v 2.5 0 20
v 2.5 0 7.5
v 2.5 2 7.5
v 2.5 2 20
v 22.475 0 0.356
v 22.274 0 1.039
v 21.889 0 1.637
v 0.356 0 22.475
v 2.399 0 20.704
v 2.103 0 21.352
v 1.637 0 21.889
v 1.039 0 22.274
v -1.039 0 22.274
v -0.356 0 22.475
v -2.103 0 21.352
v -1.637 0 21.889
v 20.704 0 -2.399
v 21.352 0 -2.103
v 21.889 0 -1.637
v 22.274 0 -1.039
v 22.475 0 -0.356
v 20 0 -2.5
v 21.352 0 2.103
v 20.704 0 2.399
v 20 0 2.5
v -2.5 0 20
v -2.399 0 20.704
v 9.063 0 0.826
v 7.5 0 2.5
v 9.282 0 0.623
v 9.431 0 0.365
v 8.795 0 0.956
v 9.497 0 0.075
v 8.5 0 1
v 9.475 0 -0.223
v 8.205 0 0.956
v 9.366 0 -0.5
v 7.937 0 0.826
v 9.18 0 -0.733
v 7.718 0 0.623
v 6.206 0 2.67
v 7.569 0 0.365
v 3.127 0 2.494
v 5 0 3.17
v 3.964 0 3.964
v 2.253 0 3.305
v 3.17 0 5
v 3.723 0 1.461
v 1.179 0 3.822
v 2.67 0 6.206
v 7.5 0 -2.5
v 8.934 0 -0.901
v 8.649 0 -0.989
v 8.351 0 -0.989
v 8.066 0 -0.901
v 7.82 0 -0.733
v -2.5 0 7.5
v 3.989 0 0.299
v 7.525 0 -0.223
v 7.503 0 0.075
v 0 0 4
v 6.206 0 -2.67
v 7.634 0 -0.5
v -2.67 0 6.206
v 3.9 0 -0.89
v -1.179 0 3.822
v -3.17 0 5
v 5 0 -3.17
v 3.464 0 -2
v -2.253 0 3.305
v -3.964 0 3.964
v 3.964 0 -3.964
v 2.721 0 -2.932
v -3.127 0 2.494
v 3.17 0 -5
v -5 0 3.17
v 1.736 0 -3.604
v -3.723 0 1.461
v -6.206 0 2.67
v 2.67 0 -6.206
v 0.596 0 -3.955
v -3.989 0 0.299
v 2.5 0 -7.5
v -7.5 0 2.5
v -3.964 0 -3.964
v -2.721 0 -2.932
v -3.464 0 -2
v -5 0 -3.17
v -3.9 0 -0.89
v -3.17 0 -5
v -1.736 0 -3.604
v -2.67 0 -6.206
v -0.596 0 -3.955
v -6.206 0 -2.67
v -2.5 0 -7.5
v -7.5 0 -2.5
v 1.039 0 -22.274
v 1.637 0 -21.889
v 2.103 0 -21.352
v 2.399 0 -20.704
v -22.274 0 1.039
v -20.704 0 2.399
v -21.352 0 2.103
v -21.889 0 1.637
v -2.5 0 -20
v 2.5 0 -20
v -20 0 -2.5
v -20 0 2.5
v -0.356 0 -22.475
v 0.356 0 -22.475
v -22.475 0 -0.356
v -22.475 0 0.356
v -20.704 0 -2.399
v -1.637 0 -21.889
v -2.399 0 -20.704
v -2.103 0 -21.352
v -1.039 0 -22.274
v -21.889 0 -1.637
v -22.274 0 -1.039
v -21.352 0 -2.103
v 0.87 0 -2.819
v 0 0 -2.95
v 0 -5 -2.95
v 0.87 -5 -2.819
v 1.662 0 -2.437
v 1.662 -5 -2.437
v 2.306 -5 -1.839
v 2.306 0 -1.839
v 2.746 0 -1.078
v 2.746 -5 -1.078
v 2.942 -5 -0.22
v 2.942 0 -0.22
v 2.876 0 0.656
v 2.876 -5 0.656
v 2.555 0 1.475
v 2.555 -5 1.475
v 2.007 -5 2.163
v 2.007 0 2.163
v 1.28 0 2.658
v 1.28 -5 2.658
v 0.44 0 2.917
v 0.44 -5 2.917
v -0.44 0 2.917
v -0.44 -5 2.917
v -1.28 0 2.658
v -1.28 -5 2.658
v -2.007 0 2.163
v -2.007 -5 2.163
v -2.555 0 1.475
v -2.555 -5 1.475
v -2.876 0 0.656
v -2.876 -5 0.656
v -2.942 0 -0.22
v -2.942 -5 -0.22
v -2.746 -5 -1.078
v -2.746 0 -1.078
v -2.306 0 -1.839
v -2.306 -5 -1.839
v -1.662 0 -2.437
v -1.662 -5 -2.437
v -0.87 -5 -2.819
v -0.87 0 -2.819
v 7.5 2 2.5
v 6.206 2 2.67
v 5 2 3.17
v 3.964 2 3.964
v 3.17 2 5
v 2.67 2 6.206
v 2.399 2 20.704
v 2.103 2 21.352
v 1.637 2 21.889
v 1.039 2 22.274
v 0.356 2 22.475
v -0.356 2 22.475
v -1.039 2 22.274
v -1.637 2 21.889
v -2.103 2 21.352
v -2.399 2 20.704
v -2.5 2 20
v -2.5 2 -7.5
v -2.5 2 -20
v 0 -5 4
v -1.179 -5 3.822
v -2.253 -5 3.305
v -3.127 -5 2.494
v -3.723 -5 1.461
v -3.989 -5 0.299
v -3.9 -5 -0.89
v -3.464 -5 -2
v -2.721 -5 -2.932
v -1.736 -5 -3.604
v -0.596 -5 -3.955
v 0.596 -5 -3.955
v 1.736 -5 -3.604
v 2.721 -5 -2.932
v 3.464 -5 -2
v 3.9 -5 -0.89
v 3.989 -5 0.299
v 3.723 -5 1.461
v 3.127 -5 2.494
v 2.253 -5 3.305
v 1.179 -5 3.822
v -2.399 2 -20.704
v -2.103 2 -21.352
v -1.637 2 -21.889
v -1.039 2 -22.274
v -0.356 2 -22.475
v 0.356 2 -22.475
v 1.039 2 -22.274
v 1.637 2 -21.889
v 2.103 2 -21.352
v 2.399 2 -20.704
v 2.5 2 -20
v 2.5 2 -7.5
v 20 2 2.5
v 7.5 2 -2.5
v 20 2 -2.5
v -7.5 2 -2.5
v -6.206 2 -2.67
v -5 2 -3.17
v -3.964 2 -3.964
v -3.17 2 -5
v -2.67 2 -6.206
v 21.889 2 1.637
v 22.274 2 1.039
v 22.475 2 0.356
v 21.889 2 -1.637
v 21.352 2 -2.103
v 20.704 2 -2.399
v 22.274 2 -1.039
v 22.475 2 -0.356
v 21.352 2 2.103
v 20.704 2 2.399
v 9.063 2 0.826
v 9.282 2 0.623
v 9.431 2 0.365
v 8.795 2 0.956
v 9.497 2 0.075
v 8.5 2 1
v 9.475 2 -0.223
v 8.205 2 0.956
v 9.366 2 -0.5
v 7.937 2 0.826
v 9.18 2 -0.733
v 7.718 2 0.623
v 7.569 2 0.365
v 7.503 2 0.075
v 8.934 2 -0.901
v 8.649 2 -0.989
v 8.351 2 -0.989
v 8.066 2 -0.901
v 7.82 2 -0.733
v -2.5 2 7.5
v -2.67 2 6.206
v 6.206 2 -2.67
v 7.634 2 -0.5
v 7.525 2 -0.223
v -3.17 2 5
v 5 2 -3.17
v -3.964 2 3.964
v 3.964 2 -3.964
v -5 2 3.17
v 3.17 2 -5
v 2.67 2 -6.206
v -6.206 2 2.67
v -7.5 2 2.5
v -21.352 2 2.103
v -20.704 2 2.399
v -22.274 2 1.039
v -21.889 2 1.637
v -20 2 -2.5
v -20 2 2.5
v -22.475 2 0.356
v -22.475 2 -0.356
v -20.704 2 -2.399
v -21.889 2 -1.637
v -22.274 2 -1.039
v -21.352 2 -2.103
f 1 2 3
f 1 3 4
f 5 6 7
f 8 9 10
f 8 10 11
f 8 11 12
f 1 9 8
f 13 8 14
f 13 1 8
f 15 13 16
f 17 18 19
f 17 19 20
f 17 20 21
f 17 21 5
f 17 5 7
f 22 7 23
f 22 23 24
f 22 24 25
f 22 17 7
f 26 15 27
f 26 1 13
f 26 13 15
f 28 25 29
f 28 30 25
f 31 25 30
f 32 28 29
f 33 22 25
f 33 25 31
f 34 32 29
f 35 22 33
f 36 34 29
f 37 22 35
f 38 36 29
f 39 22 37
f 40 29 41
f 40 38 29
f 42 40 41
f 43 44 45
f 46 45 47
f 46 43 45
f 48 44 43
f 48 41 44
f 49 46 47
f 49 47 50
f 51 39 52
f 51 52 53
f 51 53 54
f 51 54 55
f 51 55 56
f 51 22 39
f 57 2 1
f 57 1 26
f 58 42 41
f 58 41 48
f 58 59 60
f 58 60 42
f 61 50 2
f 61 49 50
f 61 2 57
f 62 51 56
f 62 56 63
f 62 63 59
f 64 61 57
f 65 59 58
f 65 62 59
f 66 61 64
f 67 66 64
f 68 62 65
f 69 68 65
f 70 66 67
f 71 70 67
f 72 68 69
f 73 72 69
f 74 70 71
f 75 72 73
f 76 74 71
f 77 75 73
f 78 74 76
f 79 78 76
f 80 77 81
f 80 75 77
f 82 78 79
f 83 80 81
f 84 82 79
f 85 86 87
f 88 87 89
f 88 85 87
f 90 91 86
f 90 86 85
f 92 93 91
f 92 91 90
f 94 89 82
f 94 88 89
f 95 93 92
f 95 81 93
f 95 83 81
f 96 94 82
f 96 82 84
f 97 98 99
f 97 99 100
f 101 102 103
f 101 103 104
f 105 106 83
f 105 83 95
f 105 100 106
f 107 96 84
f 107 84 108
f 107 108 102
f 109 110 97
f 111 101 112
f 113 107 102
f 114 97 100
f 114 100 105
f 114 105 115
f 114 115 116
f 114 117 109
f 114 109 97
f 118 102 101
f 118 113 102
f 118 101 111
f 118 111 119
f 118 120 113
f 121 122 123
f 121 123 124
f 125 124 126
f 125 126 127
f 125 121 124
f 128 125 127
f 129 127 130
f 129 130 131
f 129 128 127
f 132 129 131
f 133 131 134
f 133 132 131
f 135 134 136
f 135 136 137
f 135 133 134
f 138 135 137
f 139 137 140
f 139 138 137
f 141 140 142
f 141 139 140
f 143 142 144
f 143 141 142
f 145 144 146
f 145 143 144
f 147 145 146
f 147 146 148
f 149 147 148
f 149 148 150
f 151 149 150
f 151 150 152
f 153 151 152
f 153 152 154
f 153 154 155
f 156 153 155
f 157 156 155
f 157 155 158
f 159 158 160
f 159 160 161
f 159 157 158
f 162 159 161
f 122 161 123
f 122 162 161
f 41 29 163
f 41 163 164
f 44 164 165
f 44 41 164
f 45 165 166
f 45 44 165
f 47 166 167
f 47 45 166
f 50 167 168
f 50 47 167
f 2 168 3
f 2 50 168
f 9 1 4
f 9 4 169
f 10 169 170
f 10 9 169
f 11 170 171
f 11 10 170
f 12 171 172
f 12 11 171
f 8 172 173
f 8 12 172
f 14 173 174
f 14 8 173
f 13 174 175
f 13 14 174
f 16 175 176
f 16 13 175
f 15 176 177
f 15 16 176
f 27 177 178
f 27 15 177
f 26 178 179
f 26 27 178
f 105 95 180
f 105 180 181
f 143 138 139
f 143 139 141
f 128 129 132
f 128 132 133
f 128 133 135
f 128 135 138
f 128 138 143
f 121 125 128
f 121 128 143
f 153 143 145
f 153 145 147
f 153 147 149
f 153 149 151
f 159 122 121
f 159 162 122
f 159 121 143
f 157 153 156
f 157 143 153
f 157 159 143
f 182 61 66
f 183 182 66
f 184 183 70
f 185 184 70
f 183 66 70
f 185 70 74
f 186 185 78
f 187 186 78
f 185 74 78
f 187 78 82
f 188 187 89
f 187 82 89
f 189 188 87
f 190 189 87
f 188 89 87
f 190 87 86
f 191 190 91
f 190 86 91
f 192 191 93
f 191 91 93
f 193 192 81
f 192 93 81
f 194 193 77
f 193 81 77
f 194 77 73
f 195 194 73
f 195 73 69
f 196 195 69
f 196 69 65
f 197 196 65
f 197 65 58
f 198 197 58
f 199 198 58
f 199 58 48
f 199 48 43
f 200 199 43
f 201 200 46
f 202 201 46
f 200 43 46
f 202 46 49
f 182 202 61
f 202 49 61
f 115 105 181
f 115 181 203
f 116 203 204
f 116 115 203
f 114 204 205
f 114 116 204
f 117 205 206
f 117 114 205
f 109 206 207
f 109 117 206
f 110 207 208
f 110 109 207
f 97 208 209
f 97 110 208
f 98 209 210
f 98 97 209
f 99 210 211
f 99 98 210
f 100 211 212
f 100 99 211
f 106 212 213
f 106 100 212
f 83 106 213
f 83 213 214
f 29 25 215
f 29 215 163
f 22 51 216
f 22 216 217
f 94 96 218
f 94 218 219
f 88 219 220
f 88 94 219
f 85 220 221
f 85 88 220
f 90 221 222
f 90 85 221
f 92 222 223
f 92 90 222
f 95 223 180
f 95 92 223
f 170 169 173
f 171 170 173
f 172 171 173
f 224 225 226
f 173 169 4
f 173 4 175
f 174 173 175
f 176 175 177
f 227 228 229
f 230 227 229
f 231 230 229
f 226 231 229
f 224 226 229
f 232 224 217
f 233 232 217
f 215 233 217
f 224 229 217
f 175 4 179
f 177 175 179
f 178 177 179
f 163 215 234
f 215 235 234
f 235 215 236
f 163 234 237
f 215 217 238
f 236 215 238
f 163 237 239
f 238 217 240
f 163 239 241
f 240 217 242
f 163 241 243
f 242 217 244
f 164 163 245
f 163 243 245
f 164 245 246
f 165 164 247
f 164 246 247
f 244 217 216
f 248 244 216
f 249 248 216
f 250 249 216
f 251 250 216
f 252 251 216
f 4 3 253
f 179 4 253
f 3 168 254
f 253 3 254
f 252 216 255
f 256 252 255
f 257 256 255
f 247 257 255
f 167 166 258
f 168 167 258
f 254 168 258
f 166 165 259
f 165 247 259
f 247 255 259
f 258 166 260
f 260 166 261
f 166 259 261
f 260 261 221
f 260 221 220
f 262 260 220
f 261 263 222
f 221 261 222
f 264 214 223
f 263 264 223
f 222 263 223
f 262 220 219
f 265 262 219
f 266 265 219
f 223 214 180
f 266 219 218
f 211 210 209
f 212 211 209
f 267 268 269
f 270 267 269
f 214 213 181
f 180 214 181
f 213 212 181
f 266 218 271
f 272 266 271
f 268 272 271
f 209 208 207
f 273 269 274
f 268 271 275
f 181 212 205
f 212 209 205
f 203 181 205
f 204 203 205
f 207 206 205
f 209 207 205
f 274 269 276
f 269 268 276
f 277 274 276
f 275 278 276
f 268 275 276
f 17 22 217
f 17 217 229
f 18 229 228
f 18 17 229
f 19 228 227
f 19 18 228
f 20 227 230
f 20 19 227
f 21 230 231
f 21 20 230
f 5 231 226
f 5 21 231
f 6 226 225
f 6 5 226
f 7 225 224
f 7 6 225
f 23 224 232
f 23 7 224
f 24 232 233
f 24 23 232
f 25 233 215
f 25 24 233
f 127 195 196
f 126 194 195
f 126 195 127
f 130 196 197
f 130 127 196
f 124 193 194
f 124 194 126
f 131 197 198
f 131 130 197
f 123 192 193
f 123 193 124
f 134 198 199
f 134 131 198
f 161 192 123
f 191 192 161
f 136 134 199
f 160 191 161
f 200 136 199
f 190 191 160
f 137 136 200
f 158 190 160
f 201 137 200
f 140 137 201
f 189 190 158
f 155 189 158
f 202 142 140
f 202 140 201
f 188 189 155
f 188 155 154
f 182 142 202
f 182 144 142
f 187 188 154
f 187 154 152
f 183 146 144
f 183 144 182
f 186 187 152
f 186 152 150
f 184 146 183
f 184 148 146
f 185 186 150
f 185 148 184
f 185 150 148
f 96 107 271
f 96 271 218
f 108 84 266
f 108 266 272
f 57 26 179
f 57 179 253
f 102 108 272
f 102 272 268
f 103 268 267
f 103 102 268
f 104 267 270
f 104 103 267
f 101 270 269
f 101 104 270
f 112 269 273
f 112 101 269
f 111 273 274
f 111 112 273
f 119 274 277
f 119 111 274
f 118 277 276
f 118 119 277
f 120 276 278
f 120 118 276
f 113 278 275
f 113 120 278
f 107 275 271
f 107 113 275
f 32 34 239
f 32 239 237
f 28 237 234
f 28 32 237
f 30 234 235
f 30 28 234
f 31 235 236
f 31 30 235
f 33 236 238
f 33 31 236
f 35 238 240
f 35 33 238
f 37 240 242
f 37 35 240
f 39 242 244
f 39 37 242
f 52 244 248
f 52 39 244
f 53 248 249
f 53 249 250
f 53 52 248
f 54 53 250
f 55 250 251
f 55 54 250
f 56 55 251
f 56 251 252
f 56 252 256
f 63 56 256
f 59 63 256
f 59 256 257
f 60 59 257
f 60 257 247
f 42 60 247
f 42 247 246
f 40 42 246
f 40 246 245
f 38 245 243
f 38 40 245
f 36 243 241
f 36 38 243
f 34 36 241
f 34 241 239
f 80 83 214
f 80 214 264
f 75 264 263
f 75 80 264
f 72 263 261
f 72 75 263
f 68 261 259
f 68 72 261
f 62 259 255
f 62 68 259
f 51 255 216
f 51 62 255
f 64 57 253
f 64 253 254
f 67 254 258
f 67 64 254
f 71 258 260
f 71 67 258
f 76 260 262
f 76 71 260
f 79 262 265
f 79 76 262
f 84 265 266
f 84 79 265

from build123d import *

# Parameters (mm, degrees)
SKETCH1_R           = 1
BOSS_EXTRUDE1_DEPTH = 2
SKETCH2_R           = 4
SKETCH2_R_2         = 2.95
BOSS_EXTRUDE2_DEPTH = 5


with BuildPart() as part:
    # Sketch1 → Boss-Extrude1 (new body)
    with BuildSketch(Plane(origin=(0, 0, 0), x_dir=(1, 0, 0), z_dir=(0, 1, 0))):
        with BuildLine():
            Line((2.5, 20), (2.5, 7.5))
            ThreePointArc((2.5, 7.5), (3.964466094, 3.964466094), (7.5, 2.5))
            Line((7.5, 2.5), (20, 2.5))
            ThreePointArc((20, 2.5), (22.5, 0), (20, -2.5))
            Line((20, -2.5), (7.5, -2.5))
            ThreePointArc((7.5, -2.5), (3.964466094, -3.964466094), (2.5, -7.5))
            Line((2.5, -7.5), (2.5, -20))
            ThreePointArc((2.5, -20), (0, -22.5), (-2.5, -20))
            Line((-2.5, -20), (-2.5, -7.5))
            ThreePointArc((-2.5, -7.5), (-3.964466094, -3.964466094), (-7.5, -2.5))
            Line((-7.5, -2.5), (-20, -2.5))
            ThreePointArc((-20, -2.5), (-22.5, 0), (-20, 2.5))
            Line((-20, 2.5), (-7.5, 2.5))
            ThreePointArc((-7.5, 2.5), (-3.964466094, 3.964466094), (-2.5, 7.5))
            Line((-2.5, 7.5), (-2.5, 20))
            ThreePointArc((-2.5, 20), (0, 22.5), (2.5, 20))
        make_face()
        with Locations(Location((8.5, 0, 0), (0, 0, 270))):
            Circle(SKETCH1_R, mode=Mode.SUBTRACT)
    extrude(amount=BOSS_EXTRUDE1_DEPTH)

    # Sketch2 → Boss-Extrude2 (add)
    with BuildSketch(Plane.XZ):
        with Locations(Location((0, 0, 0), (0, 0, 90))):
            Circle(SKETCH2_R)
        with Locations(Location((0, 0, 0), (0, 0, 270))):
            Circle(SKETCH2_R_2, mode=Mode.SUBTRACT)
    extrude(amount=BOSS_EXTRUDE2_DEPTH)


solid = part.part
